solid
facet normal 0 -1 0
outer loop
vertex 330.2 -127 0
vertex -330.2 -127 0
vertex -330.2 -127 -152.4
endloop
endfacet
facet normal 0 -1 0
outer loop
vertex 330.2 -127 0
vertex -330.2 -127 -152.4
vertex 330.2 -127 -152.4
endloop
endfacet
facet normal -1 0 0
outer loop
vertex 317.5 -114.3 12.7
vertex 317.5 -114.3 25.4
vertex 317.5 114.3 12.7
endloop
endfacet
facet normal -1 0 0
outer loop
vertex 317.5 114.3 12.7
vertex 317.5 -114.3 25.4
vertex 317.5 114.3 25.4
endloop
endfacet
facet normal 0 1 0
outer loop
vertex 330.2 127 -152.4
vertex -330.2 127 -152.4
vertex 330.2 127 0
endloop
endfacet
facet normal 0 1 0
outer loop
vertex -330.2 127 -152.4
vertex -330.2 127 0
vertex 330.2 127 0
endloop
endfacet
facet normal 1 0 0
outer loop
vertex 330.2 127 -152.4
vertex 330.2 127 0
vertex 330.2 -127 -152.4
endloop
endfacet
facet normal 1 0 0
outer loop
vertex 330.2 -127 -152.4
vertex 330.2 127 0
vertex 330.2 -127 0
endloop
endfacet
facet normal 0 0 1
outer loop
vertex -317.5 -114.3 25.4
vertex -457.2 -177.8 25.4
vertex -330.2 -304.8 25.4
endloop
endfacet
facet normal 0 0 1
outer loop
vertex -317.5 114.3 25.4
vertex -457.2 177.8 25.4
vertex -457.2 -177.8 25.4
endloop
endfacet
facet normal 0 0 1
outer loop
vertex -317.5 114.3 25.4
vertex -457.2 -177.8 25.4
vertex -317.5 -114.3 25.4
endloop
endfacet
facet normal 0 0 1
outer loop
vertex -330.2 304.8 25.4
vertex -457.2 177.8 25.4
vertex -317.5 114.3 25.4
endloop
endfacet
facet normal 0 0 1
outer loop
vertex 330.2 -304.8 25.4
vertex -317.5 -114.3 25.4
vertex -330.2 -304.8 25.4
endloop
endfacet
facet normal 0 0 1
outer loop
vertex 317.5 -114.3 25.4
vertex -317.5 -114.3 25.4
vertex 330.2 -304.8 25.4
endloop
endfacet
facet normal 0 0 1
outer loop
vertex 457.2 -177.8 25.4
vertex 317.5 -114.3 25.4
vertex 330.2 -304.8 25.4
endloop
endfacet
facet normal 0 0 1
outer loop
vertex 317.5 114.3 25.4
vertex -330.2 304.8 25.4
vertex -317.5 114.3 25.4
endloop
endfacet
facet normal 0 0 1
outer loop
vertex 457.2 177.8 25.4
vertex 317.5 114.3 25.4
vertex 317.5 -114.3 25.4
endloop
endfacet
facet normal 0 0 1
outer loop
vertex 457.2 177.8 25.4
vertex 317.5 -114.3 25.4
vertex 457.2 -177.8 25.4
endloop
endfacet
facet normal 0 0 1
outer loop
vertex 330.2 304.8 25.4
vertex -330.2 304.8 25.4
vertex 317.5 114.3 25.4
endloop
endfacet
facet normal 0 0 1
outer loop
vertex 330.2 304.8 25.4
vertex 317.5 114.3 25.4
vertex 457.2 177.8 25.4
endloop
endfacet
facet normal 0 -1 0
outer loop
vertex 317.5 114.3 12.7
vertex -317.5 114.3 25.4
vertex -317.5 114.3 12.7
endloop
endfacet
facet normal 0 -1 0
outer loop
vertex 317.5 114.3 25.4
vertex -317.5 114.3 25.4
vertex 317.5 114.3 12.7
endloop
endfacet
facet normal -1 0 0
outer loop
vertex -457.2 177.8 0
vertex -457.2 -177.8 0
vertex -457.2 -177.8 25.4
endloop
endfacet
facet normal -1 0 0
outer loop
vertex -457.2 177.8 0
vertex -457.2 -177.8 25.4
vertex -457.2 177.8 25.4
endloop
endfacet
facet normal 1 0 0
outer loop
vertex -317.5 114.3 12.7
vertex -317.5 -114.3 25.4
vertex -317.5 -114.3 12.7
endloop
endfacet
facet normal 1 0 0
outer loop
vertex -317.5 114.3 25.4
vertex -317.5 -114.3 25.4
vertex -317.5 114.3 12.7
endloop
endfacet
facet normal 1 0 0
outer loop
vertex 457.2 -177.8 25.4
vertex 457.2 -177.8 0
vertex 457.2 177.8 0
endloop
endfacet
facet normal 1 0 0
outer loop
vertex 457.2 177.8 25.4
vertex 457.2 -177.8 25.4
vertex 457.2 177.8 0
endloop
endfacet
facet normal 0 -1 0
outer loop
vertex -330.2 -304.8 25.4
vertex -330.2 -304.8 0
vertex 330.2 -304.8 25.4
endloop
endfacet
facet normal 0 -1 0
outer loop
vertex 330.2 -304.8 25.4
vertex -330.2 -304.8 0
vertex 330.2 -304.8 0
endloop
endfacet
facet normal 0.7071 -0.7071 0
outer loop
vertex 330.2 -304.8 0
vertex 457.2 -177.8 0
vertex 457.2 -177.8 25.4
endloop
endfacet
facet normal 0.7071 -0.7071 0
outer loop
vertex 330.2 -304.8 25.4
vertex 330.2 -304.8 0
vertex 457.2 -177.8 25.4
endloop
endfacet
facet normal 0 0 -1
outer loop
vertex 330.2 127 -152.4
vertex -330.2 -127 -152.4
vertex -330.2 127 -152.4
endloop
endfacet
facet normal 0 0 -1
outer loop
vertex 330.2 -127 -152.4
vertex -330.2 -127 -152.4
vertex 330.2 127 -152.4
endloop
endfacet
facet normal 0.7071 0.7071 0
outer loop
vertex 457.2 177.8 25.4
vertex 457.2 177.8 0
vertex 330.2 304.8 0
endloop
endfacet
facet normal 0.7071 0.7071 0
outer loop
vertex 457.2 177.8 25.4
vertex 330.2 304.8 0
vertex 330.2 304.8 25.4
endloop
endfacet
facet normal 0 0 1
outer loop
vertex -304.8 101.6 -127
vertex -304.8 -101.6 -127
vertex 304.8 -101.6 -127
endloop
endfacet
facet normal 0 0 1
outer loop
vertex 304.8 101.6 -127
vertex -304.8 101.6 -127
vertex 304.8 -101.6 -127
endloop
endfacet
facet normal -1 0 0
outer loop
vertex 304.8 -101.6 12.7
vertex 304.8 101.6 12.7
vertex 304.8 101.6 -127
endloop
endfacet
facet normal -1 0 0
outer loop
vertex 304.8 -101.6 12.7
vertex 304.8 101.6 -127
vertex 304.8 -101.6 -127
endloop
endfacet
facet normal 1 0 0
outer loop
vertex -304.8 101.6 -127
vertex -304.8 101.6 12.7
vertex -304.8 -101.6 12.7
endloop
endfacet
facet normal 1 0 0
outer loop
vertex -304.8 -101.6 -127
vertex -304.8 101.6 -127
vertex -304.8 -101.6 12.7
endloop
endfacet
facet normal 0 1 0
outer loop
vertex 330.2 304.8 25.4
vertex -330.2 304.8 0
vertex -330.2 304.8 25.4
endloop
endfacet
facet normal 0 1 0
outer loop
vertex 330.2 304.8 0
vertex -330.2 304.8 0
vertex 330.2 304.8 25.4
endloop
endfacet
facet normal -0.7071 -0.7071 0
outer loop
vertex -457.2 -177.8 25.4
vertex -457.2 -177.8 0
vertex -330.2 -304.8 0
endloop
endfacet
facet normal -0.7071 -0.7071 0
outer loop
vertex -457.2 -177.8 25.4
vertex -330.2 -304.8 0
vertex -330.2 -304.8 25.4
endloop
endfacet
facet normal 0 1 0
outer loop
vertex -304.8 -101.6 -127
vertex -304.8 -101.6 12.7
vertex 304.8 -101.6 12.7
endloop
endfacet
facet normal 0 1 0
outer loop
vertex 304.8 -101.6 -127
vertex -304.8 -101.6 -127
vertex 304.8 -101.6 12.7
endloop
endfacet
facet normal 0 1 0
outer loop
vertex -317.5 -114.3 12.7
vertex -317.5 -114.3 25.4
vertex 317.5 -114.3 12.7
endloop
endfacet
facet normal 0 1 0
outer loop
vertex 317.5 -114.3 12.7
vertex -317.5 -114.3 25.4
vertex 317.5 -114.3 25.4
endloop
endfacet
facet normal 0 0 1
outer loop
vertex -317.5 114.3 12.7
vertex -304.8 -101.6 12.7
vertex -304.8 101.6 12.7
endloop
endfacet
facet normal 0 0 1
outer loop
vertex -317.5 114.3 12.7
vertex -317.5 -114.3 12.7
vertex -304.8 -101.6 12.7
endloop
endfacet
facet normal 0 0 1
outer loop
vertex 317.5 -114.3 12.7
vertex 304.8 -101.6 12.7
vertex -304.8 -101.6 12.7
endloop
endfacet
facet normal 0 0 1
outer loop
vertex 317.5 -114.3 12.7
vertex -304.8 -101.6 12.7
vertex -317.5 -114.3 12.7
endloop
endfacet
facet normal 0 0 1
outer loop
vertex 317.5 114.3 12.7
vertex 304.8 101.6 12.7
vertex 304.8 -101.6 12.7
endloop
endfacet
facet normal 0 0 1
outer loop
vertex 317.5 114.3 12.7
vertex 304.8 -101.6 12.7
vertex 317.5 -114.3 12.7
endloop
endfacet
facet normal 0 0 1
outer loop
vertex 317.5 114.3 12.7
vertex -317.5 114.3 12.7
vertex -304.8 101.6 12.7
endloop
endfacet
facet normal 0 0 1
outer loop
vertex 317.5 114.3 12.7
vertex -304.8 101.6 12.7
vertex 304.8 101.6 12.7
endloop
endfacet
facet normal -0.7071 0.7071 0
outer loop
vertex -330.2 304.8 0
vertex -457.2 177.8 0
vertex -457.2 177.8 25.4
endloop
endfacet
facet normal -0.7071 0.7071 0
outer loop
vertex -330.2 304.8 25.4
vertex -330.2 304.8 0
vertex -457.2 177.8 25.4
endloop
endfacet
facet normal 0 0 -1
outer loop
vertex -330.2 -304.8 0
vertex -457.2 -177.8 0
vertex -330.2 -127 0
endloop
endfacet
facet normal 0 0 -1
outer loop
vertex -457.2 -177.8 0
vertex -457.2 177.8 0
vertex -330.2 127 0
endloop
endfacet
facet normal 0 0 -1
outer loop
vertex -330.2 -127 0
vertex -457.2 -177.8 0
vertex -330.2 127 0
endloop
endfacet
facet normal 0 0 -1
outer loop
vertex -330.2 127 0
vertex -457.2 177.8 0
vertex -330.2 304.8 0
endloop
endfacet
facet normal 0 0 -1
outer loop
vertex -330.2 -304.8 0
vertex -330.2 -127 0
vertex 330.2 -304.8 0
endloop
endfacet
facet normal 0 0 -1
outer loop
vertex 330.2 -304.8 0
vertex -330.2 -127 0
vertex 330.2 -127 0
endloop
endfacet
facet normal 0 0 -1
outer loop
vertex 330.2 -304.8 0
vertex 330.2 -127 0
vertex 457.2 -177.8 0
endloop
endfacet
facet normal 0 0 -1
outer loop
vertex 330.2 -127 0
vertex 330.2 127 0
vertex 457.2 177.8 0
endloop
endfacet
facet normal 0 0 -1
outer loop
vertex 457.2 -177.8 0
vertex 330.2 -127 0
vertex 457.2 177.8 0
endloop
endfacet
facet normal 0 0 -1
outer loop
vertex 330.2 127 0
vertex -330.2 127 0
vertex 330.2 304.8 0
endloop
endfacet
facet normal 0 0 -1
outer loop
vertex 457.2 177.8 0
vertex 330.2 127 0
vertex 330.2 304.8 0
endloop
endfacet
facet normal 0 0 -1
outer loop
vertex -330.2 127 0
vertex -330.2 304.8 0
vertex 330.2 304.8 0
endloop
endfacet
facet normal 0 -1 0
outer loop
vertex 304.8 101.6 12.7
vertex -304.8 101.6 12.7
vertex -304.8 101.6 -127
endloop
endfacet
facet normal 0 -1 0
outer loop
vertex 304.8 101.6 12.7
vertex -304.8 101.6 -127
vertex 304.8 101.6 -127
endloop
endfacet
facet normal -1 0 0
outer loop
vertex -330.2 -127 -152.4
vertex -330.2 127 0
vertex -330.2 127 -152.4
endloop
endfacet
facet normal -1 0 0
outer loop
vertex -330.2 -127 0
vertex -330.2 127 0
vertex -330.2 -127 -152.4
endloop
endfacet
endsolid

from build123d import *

# Parameters (mm, degrees)
F0_W      = 914.4
F0_H      = 609.6
F1_DEPTH  = 25.4
F2_SIZE   = 127
F3_W      = 609.6
F3_H      = 203.2
F4_DEPTH  = 25.4
F5_W      = 660.4
F5_H      = 254
F5_W_2    = 609.6
F5_H_2    = 203.2
F6_DEPTH  = 127
F7_W      = 660.4
F7_H      = 254
F8_DEPTH  = 25.4
F9_W      = 635
F9_H      = 228.6
F10_DEPTH = 12.7


with BuildPart() as f1:
    # F0 (on Top) → F1 (new body)
    with BuildSketch(Plane.XY):
        Rectangle(F0_W, F0_H)
    extrude(amount=F1_DEPTH)

    # F2
    f2_edges = [f1.edges().sort_by_distance(p)[0] for p in [
        (-457.2, -304.8, 12.7),
        (457.2, -304.8, 12.7),
        (457.2, 304.8, 12.7),
        (-457.2, 304.8, 12.7),
    ]]
    chamfer(f2_edges, length=F2_SIZE)

    # F3 (on face) → F4 (cut, through all)
    with BuildSketch(Plane.XY.offset(25.4)):
        Rectangle(F3_W, F3_H)
    extrude(amount=-F4_DEPTH, mode=Mode.SUBTRACT)

    # F5 (on face) → F6 (join)
    with BuildSketch(Plane(origin=(0, 0, 0), x_dir=(1, 0, 0), z_dir=(0, 0, -1))):
        Rectangle(F5_W, F5_H)
        Rectangle(F5_W_2, F5_H_2, mode=Mode.SUBTRACT)
    extrude(amount=F6_DEPTH)

    # F7 (on face) → F8 (join)
    with BuildSketch(Plane(origin=(0, 0, -127), x_dir=(1, 0, 0), z_dir=(0, 0, -1))):
        Rectangle(F7_W, F7_H)
    extrude(amount=F8_DEPTH)

    # F9 (on face) → F10 (cut)
    with BuildSketch(Plane.XY.offset(25.4)):
        Rectangle(F9_W, F9_H)
    extrude(amount=-F10_DEPTH, mode=Mode.SUBTRACT)


solid = f1.part
